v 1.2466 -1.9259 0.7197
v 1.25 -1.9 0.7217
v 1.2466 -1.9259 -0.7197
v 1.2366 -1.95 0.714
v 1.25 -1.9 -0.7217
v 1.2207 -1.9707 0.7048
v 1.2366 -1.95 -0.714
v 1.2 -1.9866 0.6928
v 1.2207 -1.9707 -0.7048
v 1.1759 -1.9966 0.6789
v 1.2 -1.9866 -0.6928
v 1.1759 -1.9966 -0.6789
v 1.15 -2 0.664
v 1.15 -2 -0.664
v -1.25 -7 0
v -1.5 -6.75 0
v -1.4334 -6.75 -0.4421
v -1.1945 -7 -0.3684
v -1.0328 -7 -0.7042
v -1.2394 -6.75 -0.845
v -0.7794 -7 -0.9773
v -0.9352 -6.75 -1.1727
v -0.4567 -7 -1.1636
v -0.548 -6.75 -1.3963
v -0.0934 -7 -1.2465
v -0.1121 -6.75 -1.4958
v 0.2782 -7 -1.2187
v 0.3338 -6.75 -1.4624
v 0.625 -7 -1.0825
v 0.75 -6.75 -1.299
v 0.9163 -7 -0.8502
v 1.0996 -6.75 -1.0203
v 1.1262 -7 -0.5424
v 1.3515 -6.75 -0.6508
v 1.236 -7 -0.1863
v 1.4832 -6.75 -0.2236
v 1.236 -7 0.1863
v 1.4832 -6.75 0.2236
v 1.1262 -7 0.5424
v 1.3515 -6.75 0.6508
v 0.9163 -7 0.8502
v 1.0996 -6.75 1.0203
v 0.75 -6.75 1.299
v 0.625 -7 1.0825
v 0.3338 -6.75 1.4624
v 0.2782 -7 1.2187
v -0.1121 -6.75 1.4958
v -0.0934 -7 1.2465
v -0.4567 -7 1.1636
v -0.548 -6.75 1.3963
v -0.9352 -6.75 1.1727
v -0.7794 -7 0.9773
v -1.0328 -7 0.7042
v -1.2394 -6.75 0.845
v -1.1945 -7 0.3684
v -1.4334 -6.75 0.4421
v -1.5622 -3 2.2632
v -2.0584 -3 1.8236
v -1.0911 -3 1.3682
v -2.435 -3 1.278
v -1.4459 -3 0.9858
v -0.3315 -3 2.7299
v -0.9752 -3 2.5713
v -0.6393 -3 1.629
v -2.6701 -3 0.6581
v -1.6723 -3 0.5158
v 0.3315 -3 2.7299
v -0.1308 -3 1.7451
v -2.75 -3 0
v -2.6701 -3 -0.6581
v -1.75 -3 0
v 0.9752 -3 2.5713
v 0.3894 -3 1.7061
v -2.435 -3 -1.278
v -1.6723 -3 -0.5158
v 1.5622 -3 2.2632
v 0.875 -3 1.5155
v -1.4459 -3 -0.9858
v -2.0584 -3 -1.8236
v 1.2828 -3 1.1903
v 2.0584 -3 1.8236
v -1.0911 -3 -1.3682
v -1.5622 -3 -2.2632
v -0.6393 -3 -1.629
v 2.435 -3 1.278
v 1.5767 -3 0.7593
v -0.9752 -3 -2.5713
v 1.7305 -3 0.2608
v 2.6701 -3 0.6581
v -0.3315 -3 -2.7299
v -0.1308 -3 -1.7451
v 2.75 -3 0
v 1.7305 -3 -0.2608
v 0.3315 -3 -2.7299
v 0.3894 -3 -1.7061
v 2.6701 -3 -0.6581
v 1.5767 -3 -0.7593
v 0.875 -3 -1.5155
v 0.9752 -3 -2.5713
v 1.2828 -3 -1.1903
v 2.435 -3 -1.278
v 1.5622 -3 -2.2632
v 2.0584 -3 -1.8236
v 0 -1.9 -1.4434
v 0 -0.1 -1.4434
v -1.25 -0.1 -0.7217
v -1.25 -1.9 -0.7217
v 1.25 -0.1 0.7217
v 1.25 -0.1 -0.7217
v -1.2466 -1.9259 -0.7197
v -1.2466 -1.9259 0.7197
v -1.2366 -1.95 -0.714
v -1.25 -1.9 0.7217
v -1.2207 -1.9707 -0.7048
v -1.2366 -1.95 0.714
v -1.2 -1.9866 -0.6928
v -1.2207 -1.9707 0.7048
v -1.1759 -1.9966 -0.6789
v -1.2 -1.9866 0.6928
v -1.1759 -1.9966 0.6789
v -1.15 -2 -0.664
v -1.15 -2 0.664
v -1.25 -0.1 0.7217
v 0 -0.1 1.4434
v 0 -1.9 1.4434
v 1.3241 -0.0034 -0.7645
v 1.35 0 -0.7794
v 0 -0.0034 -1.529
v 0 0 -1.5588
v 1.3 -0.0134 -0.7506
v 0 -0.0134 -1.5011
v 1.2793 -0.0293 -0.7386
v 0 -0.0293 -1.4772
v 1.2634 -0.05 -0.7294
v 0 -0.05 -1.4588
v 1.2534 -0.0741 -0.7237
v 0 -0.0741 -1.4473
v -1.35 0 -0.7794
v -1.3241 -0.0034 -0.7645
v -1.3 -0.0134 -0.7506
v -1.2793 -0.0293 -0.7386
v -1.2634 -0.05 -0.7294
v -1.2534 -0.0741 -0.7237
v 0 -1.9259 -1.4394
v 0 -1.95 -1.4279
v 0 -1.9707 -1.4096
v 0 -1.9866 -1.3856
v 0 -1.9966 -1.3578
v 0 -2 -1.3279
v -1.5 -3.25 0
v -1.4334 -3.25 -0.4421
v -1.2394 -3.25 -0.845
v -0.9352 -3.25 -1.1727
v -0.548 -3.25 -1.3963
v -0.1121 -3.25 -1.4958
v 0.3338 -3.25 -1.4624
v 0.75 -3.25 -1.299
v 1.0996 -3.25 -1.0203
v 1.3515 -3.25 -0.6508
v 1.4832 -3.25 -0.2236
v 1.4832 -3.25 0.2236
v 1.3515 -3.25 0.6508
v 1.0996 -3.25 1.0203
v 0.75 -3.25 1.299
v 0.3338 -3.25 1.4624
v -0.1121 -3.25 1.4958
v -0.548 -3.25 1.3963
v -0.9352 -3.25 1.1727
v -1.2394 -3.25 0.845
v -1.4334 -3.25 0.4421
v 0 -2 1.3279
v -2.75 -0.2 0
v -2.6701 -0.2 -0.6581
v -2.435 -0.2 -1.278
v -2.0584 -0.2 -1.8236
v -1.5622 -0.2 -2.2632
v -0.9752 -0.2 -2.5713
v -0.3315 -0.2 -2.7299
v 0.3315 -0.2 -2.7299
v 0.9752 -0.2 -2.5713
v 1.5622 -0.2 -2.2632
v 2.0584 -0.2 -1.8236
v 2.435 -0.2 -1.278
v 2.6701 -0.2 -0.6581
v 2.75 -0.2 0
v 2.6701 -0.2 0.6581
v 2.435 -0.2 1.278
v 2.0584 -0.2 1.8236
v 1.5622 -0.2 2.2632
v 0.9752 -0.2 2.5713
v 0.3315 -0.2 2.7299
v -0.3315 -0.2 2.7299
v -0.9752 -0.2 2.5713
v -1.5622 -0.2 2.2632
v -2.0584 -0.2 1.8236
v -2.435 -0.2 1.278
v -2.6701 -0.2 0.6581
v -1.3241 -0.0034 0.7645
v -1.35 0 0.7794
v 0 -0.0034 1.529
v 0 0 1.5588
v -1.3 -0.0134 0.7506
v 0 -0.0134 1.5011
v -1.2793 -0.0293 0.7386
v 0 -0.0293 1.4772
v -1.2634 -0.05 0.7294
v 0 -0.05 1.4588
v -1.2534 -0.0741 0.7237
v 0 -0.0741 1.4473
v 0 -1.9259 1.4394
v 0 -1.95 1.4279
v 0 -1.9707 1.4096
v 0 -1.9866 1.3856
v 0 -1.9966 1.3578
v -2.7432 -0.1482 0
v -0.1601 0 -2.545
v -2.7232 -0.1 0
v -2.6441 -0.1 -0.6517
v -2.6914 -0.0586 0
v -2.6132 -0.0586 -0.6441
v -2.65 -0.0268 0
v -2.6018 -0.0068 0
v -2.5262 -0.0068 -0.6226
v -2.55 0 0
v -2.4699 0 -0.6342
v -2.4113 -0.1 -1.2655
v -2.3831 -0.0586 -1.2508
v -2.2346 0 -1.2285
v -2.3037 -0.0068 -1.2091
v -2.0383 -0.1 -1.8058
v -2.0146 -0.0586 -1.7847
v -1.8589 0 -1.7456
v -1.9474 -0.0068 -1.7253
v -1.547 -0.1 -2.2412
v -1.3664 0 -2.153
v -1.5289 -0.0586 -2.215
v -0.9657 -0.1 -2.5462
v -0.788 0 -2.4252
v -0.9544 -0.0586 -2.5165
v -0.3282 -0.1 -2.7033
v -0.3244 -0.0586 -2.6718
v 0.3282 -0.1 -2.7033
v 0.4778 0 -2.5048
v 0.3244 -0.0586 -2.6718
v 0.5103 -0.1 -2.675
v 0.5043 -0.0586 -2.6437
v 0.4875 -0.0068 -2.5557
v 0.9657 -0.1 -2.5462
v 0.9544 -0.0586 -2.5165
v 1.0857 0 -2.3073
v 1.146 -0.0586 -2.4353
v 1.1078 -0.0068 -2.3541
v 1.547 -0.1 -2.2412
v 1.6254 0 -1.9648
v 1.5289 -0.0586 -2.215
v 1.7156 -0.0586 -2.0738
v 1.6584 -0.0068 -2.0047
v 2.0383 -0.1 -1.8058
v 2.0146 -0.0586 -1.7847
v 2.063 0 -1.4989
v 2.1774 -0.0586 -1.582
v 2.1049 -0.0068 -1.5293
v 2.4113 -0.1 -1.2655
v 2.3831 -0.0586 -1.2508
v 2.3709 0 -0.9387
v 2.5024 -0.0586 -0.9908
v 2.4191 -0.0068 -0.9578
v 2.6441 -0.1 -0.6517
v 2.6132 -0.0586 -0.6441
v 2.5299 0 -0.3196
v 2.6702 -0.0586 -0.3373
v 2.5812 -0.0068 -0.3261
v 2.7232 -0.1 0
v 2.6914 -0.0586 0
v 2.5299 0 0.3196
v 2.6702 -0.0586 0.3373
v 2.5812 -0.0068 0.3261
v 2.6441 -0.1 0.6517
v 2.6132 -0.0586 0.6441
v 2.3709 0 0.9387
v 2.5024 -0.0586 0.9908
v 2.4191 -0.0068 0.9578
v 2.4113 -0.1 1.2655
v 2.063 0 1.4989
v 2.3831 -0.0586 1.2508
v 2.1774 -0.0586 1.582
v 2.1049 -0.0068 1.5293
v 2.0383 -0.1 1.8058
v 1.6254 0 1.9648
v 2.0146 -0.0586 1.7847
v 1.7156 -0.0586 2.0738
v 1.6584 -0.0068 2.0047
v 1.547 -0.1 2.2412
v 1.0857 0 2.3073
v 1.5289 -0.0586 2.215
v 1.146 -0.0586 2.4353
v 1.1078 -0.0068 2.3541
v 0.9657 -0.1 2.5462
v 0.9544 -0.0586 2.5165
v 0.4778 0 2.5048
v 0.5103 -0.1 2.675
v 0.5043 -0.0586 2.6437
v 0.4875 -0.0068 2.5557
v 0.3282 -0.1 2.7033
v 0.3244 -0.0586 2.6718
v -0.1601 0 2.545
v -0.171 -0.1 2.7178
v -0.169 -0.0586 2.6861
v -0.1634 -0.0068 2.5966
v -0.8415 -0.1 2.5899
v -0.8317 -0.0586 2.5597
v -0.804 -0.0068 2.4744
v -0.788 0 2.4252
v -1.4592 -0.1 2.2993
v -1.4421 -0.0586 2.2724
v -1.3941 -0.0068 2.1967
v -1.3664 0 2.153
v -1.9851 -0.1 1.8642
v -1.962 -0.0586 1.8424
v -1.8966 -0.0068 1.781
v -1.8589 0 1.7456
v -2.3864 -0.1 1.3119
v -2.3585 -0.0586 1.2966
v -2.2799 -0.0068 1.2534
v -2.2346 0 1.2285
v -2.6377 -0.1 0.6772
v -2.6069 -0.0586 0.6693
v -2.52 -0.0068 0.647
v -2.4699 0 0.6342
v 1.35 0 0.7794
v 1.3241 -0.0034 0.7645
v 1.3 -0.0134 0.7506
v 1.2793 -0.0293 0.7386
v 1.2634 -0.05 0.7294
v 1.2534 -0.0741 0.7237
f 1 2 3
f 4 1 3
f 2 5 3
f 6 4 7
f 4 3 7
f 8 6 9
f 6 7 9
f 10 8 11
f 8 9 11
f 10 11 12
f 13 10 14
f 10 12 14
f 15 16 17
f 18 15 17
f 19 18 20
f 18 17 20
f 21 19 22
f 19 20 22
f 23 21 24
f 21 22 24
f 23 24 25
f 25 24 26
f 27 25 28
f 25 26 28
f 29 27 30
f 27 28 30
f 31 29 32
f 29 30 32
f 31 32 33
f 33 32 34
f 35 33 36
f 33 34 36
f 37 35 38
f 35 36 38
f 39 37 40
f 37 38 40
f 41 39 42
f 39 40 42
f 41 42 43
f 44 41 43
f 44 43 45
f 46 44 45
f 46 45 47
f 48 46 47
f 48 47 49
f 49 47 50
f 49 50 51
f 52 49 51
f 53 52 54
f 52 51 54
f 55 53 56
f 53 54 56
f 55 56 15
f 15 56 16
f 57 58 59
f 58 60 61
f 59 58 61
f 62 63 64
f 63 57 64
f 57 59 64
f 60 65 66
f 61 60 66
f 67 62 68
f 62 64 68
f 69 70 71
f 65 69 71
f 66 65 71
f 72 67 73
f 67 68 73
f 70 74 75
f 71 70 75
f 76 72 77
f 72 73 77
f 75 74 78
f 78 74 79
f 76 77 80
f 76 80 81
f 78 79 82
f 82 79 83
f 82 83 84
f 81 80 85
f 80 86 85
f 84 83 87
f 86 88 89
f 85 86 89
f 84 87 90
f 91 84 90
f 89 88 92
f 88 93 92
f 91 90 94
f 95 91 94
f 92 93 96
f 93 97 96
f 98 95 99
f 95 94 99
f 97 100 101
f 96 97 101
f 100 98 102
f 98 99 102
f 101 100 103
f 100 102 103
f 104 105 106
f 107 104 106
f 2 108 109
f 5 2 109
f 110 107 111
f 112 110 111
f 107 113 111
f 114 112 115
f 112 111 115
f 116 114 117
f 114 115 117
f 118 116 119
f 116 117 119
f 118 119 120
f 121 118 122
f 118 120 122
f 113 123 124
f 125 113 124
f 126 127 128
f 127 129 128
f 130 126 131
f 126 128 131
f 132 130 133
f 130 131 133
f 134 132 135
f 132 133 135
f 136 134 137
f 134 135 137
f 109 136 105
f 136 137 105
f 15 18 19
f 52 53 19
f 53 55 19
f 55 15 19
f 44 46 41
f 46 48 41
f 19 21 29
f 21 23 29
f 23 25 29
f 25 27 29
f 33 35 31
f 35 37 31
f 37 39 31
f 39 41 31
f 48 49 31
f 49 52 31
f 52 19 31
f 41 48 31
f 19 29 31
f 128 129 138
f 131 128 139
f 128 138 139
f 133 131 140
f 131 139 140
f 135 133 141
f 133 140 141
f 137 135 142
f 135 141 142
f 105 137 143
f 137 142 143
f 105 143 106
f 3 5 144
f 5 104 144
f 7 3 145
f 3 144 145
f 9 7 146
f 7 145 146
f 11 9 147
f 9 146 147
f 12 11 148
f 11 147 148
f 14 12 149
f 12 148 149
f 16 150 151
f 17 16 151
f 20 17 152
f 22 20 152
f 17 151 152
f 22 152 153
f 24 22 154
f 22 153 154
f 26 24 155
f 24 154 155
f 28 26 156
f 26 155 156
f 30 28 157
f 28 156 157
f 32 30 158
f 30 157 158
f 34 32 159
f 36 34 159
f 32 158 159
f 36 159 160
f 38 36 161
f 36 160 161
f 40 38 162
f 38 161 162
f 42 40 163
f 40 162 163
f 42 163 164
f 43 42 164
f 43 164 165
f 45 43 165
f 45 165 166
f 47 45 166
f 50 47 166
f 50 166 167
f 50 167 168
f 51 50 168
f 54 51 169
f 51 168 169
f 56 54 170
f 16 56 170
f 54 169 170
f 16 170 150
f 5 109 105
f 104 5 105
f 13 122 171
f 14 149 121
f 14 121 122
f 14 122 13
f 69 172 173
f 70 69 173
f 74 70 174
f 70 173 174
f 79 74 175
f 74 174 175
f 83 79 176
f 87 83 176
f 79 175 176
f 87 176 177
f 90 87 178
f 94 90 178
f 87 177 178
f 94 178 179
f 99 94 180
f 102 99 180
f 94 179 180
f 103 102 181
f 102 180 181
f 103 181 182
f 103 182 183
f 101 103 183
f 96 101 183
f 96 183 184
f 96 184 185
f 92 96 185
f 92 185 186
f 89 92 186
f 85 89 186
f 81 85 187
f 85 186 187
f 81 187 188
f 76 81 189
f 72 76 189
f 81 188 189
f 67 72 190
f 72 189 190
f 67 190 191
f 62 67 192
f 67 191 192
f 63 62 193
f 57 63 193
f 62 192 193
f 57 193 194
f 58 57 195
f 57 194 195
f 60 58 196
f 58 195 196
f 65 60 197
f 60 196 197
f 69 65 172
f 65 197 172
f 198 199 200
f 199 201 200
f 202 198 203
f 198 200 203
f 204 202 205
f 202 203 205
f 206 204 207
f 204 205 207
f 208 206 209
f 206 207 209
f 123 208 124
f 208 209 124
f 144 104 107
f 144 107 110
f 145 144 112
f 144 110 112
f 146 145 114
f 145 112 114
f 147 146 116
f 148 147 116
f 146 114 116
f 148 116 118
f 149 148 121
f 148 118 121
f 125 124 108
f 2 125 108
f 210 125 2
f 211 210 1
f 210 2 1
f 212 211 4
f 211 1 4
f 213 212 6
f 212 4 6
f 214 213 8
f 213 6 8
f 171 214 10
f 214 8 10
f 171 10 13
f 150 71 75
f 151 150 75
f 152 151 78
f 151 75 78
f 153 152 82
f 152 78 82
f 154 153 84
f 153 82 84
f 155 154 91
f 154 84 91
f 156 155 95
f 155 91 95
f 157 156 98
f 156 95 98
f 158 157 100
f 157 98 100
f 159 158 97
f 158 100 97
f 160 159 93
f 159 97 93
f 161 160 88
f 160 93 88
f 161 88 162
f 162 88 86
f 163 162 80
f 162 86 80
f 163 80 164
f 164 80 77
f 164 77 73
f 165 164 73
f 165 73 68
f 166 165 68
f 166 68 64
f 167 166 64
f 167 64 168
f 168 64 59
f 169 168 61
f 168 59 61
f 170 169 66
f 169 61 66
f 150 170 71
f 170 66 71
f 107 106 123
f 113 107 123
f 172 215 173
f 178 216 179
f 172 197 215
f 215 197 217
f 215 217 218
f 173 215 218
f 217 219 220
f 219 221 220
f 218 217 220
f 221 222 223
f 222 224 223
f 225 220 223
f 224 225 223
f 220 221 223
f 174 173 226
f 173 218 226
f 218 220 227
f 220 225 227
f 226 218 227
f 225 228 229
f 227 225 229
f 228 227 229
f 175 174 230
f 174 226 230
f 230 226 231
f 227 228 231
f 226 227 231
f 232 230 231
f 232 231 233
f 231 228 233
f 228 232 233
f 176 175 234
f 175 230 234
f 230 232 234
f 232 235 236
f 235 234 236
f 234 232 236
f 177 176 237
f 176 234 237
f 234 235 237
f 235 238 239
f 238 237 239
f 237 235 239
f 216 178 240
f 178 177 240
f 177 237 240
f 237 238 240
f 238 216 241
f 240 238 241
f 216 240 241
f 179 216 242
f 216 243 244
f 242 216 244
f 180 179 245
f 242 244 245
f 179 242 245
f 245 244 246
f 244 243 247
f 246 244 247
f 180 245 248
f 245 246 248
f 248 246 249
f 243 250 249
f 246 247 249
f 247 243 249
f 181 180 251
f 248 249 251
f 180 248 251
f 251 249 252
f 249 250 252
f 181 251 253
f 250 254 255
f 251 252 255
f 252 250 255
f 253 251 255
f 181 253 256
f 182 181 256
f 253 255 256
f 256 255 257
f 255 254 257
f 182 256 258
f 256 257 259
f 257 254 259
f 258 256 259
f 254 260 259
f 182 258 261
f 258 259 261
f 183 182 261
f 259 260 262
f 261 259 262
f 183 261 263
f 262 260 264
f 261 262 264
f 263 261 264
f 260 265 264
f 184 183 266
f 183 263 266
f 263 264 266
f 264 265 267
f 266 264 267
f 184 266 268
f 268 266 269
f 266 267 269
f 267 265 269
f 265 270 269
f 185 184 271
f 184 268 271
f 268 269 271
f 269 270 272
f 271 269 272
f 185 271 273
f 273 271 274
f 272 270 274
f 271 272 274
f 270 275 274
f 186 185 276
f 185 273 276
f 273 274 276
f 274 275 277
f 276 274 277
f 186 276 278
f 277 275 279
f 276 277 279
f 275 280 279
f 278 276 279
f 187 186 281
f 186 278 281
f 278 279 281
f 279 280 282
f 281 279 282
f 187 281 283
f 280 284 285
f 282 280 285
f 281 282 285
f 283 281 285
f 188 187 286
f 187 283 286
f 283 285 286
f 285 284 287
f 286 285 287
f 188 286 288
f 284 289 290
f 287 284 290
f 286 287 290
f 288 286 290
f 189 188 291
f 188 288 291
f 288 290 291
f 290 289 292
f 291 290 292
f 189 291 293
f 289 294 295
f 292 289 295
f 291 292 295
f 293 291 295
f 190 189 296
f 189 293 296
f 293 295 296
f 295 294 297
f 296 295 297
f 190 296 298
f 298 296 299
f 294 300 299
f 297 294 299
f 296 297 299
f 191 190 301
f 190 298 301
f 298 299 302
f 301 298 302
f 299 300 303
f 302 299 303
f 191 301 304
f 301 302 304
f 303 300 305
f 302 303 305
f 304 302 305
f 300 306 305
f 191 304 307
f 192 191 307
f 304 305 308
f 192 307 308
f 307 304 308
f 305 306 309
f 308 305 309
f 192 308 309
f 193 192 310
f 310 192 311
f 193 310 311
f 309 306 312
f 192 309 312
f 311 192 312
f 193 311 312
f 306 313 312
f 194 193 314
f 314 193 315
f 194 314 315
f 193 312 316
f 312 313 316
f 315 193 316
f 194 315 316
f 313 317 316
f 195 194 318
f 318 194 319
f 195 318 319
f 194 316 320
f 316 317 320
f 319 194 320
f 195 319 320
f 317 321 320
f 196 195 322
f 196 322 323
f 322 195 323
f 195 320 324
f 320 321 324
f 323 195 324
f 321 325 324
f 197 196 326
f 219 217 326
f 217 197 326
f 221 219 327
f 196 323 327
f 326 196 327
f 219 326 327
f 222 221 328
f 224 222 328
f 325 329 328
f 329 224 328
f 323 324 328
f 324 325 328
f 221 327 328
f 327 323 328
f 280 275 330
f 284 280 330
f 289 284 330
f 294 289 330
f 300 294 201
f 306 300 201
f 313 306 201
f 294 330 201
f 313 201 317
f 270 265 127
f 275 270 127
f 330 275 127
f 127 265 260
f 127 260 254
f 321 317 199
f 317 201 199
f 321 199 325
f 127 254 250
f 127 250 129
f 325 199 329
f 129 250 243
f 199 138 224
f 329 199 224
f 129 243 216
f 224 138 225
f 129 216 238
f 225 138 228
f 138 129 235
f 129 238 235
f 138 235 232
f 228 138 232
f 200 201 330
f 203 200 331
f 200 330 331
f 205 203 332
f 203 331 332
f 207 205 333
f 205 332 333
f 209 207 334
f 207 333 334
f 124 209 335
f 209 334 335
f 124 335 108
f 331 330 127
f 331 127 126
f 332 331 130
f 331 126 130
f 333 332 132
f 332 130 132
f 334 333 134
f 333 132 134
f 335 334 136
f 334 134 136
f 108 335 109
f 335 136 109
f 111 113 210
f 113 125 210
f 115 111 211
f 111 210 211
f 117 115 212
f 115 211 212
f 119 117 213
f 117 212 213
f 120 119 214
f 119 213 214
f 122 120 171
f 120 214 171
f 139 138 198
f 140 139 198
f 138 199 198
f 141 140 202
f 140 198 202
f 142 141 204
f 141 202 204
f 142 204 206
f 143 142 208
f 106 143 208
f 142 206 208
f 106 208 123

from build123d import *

# Parameters (mm, degrees)
CHAMFER1_SIZE      = 0.25
FILLET1_R          = 0.2
CUT_EXTRUDE1_DEPTH = 2
FILLET2_R          = 0.1


with BuildPart() as part:
    # Sketch1 → Revolve1 (revolve)
    with BuildSketch(Plane.XY):
        Polygon((0, -7), (-1.5, -7), (-1.5, -3), (-2.75, -3), (-2.75, 0), (0, 0), align=None)
    revolve(axis=Axis((0, 0, 0), (0, -1, 0)))

    # Chamfer1
    chamfer1_edges = [part.edges().sort_by_distance(p)[0] for p in [
        (1.5, -3, 0),
        (1.5, -7, 0),
    ]]
    chamfer(chamfer1_edges, length=CHAMFER1_SIZE)

    # Fillet1
    fillet1_edges = [part.edges().sort_by_distance(p)[0] for p in [
        (2.75, 0, 0),
    ]]
    fillet(fillet1_edges, radius=FILLET1_R)

    # Sketch2 → Cut-Extrude1 (cut)
    with BuildSketch(Plane(origin=(0, 0, 0), x_dir=(1, 0, 0), z_dir=(0, 1, 0))):
        Polygon((0, 1.443375673), (-1.25, 0.721687836), (-1.25, -0.721687836), (0, -1.443375673), (1.25, -0.721687836), (1.25, 0.721687836), align=None)
    extrude(amount=-CUT_EXTRUDE1_DEPTH, mode=Mode.SUBTRACT)

    # Fillet2
    fillet2_edges = [part.edges().sort_by_distance(p)[0] for p in [
        (0.625, -2, -1.082531755),
        (1.25, -2, 0),
        (0.625, -2, 1.082531755),
        (-0.625, -2, 1.082531755),
        (-1.25, -2, 0),
        (-0.625, -2, -1.082531755),
        (0.625, 0, -1.082531755),
        (-0.625, 0, -1.082531755),
        (-1.25, 0, 0),
        (-0.625, 0, 1.082531755),
        (0.625, 0, 1.082531755),
        (1.25, 0, 0),
    ]]
    fillet(fillet2_edges, radius=FILLET2_R)


solid = part.part
